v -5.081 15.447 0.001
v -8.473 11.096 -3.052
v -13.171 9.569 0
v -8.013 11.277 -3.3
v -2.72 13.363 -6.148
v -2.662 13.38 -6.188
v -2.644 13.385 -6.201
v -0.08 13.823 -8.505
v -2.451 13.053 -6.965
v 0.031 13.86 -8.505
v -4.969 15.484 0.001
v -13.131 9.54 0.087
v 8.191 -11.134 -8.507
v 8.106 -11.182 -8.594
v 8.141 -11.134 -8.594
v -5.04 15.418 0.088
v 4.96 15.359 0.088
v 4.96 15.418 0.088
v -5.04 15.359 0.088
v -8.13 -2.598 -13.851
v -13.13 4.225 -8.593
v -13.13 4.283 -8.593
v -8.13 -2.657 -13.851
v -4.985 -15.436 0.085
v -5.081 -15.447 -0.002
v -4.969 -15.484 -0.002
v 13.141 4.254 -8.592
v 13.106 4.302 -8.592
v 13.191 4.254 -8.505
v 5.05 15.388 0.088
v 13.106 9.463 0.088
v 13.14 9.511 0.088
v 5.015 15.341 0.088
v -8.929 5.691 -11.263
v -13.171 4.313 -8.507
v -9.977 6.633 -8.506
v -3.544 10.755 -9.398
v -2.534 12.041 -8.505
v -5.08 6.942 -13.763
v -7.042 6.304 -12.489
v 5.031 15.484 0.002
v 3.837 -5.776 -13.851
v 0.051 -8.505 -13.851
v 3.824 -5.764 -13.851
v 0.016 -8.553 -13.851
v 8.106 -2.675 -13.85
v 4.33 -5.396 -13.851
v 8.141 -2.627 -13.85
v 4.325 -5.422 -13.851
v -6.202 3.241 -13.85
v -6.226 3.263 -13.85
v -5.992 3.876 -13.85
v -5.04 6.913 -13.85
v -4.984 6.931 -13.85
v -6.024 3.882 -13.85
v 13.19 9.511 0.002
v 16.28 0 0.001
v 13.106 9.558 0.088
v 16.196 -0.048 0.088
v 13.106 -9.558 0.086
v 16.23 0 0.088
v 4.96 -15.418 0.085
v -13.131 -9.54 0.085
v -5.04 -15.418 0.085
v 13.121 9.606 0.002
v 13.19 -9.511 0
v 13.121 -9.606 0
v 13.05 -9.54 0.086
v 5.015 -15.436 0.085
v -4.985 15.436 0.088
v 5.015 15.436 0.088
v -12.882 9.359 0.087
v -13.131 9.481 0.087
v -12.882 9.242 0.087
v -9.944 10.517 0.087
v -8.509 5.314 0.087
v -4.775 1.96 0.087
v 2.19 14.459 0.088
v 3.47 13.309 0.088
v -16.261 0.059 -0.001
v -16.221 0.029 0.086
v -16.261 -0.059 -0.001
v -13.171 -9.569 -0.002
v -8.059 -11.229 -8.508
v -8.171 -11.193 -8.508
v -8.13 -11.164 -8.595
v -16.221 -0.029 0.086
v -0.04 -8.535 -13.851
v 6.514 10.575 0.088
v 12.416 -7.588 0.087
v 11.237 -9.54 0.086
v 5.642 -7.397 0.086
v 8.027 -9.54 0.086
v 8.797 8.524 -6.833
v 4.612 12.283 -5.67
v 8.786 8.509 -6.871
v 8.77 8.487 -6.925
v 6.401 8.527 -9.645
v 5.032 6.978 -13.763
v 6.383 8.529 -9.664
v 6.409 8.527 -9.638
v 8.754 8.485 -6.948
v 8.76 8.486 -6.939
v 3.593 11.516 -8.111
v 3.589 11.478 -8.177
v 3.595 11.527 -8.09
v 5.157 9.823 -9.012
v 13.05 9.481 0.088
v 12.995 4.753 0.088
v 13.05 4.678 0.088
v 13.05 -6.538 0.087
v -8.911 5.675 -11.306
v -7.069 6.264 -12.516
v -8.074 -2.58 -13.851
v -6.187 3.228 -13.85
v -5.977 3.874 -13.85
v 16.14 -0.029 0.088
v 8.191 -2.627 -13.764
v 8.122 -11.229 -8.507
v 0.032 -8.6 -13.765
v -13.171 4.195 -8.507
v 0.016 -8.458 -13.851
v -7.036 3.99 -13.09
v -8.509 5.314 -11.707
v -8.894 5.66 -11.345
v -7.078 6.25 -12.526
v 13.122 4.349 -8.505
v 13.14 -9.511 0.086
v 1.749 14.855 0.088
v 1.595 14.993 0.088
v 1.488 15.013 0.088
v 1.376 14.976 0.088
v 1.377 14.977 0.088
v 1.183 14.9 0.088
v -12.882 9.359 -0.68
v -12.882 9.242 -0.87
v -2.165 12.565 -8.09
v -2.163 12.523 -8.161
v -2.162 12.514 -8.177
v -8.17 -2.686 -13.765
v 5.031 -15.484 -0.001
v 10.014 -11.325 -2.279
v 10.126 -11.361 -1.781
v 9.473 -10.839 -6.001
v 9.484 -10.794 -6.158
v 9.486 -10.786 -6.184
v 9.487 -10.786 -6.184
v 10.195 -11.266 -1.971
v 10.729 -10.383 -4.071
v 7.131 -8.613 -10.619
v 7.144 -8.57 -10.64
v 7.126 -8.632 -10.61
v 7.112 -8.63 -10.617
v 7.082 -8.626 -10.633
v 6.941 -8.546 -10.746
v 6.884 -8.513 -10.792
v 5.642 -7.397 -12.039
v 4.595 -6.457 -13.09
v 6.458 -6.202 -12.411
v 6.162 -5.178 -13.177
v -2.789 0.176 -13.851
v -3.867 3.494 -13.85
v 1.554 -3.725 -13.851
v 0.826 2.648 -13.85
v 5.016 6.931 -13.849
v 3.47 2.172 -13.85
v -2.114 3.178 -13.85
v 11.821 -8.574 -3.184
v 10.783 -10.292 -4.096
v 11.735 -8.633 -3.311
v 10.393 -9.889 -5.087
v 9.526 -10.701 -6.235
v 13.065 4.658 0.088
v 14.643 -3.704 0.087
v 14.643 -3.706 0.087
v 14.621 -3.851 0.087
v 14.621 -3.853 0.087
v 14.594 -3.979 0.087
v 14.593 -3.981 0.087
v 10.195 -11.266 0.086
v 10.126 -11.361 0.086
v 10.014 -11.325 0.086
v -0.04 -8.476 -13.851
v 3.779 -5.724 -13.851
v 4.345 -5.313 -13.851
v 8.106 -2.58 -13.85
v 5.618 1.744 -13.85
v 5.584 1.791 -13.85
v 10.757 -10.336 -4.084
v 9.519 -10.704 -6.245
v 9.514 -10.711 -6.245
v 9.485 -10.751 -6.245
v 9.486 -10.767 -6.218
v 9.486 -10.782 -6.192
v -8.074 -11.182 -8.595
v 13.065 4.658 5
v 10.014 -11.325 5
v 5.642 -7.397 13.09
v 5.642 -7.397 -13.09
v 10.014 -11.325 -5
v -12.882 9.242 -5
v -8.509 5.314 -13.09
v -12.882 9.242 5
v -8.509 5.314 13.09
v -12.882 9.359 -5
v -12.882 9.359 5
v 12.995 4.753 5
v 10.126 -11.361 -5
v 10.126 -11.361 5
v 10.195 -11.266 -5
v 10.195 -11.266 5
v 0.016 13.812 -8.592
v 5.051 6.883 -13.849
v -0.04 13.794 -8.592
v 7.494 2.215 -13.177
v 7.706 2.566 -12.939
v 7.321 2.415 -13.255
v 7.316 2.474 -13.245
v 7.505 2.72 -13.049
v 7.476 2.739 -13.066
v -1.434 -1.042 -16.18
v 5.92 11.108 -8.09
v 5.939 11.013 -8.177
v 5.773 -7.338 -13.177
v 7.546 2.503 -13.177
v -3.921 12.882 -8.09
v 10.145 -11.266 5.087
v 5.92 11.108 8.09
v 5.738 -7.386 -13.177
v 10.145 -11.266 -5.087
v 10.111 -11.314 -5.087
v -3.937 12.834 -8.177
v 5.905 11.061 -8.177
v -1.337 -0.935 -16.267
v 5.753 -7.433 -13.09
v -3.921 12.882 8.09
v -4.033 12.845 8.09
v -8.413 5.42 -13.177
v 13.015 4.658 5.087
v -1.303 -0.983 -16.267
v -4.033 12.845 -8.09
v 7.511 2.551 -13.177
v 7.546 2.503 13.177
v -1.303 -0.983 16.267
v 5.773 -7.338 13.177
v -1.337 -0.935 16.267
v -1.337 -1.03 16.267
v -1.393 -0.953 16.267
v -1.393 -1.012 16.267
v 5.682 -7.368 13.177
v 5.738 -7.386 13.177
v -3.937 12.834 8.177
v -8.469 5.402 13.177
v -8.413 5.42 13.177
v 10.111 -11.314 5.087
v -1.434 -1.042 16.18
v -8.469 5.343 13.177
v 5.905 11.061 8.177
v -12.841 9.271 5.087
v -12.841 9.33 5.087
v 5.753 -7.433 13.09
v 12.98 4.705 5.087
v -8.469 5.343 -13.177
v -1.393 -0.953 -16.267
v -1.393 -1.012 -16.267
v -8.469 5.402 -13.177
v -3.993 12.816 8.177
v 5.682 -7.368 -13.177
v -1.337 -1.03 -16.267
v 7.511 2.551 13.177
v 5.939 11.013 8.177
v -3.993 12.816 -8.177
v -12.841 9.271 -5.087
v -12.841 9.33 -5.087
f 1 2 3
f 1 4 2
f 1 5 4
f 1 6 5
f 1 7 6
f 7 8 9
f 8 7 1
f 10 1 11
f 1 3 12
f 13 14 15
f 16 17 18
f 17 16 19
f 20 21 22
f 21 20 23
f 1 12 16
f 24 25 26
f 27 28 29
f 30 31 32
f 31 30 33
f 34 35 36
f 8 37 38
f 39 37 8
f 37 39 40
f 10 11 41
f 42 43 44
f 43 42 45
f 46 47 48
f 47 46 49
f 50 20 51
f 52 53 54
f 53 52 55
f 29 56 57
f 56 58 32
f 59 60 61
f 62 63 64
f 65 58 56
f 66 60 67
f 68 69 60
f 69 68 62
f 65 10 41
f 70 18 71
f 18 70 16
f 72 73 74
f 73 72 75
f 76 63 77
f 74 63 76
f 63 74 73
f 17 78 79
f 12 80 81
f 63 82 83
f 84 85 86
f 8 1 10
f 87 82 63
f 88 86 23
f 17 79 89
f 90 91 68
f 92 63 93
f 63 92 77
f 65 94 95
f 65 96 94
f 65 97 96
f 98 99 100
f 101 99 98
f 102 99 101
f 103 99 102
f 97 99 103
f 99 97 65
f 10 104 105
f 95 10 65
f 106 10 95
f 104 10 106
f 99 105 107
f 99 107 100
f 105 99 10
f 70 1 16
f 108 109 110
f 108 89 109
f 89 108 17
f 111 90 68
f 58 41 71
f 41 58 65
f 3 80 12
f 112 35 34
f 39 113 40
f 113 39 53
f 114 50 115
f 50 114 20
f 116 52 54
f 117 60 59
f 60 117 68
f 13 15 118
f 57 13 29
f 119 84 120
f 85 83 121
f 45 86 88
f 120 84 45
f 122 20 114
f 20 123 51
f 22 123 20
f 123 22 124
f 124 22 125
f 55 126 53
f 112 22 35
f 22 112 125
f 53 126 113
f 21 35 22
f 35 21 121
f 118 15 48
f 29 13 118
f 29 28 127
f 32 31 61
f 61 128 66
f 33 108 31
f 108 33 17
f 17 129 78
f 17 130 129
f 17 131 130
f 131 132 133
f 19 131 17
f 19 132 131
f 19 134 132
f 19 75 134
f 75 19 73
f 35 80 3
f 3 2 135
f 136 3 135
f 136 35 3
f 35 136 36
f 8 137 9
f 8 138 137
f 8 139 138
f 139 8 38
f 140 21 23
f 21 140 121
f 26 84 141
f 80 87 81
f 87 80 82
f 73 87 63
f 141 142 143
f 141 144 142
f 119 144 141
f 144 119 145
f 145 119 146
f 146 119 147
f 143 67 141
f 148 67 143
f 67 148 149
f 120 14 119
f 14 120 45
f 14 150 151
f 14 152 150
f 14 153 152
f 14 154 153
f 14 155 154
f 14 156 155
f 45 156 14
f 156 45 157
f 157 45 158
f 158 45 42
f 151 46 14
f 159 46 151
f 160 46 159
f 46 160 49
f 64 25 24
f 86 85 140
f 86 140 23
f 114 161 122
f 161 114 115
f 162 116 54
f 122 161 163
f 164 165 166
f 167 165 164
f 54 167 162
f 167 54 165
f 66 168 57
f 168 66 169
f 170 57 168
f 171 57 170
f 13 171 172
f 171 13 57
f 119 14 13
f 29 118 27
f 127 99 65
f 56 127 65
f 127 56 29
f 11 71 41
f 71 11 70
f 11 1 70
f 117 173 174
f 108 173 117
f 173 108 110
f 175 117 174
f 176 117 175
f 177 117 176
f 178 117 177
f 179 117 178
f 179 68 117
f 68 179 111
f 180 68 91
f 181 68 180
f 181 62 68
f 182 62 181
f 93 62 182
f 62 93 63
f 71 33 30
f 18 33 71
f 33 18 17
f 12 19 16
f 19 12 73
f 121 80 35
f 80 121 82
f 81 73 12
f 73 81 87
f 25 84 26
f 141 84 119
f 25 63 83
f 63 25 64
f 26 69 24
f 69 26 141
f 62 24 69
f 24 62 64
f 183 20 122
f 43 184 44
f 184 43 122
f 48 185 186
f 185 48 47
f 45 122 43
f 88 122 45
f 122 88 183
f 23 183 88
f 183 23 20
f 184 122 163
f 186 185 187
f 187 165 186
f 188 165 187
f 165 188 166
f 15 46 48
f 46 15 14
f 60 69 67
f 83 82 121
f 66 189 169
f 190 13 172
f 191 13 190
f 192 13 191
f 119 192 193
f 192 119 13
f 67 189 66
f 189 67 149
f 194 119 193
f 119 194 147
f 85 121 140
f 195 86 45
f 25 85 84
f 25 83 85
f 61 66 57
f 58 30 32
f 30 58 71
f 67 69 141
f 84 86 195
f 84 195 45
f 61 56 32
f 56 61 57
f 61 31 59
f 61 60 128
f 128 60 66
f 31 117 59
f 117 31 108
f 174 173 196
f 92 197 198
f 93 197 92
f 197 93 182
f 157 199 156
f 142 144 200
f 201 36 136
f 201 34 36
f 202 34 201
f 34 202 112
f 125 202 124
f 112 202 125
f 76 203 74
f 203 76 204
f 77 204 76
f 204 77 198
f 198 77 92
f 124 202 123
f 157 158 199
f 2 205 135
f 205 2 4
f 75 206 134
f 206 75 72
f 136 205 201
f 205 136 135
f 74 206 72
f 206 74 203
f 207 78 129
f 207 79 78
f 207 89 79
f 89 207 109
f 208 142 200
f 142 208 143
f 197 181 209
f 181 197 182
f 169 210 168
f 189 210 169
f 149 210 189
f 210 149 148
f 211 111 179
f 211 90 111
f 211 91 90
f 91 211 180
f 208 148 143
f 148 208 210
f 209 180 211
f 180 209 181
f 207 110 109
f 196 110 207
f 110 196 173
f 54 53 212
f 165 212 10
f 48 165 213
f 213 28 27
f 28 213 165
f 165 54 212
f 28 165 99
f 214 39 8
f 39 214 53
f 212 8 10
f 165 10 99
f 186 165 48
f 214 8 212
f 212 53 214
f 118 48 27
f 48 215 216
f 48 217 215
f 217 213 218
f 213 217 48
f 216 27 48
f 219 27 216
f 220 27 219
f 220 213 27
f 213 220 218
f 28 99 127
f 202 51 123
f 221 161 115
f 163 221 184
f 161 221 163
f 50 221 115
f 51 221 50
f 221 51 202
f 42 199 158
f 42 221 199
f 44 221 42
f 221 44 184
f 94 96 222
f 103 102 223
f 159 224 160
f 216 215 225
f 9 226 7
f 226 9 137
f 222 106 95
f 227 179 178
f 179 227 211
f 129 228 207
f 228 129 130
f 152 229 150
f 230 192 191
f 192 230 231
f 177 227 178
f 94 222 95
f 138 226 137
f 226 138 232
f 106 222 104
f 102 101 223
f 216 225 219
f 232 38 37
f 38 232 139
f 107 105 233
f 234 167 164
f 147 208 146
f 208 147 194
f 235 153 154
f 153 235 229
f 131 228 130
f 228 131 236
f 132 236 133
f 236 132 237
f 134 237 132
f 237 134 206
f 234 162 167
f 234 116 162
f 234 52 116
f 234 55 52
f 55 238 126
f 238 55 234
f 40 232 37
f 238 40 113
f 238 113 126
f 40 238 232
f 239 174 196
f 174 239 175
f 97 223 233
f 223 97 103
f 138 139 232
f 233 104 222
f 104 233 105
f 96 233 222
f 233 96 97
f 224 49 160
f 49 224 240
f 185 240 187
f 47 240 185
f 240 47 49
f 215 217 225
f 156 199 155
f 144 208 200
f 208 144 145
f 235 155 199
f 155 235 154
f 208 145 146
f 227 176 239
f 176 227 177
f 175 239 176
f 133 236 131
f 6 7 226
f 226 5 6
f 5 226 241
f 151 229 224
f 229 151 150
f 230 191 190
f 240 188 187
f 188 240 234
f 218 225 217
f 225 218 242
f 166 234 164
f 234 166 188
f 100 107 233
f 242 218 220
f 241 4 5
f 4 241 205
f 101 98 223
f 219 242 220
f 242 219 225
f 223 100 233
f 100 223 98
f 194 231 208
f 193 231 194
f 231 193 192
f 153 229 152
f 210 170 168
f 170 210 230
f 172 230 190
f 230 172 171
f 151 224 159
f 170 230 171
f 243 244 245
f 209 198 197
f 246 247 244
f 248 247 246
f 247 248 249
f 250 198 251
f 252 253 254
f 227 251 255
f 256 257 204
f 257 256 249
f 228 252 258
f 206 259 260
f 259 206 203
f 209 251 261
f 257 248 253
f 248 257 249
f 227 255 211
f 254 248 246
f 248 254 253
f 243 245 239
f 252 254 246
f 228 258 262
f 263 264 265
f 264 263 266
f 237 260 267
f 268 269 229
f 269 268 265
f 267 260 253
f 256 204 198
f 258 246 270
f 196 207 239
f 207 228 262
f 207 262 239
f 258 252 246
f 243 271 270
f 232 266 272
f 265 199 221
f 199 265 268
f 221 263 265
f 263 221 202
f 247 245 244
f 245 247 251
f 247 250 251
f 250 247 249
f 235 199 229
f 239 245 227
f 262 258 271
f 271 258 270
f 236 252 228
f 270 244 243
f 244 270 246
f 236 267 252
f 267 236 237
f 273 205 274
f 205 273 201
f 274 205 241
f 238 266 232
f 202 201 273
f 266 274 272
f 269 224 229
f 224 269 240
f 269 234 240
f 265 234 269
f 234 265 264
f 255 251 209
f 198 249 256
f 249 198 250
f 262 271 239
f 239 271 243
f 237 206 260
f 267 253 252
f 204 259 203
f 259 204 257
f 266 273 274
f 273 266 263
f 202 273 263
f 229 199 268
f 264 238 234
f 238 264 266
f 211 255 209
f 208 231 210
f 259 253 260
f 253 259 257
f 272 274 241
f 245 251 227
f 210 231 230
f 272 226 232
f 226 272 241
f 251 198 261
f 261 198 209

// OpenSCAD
// Auto-generated OpenSCAD file

    inner_points = 10*[[-1.2800868421421776, 0.9300375234937233, -0.4999999999986175], [1.00952842451697, -1.126609720368595, 0.4999999999986175], [0.7495811565537936, 0.25032633822332373, -1.309016994373636], [0.5889249096677321, 1.1013196227617108, 0.8090169943779234], [-0.39522647677644196, 1.2786499601524015, -0.8090169943722536], [-1.2800868421428393, 0.930037523491642, 0.5000000000013824], [-0.8428092367899453, 0.5372528513524985, -1.309016994374093], [1.4571111845311355, -0.3852126115666106, 4.568012634820207e-13], [0.572250819164738, -0.7338250482273702, 1.309016994374093], [1.0095284245176321, -1.1266097203665137, -0.5000000000013824], [0.15164730431657092, 1.494104294906303, 3.5040581547463034e-12], [-0.3952264767775129, 1.2786499601490338, 0.8090169943776411], [1.2964549376461445, 0.46578067297514414, 0.5000000000021215], [0.7495811565520609, 0.25032633821787476, 1.3090169943762586], [0.5889249096688031, 1.1013196227650786, -0.8090169943719714], [-0.8428092367916781, 0.5372528513470497, 1.3090169943758017], [-0.13527920881153285, -0.09828609843406824, -1.6180339887498947], [1.2964549376468066, 0.4657806729772256, -0.49999999999787836], [-0.13527920881367453, -0.09828609844080341, 1.6180339887498947], [0.5722508191664707, -0.7338250482219214, -1.3090169943758017]];

    outer_points = 10*[[1.6180339861193813, 0.0, 9.226332282866825e-05], [-1.6180339861193813, 0.0, -9.226332282866825e-05], [4.8497926242127776e-05, 1.3764661599662604, -0.8505144895094868], [7.848867363894099e-05, -0.850514490892208, -1.3764661577284751], [1.3090654955439587, 0.4254096483352815, -0.8505340370787032], [1.3090169976177166, -0.9510565116309789, -1.9547569216365145e-05], [1.309016986875918, 0.9510565116309789, 0.00016883276146815448], [-1.308968488949676, 0.4254096483352815, -0.850683322270955], [-1.309016986875918, -0.9510565116309789, -0.00016883276146815448], [-1.3090169976177166, 0.9510565116309789, 1.9547569216365145e-05], [0.8090954784139313, -0.2627292414823533, -1.3763618133434734], [0.8090655050471297, -1.113432112705552, -0.8507149509023446], [-0.8089385077054501, -0.2627292414823533, -1.3764540766663023], [-0.8089684810722516, -1.113432112705552, -0.8508072142251732], [0.5000784791704679, 0.6883272701486257, -1.3762852439048336], [0.5000000078774243, -1.5388417610408336, -0.00012389195421817631], [0.49999999049682897, 1.5388417610408336, 0.00018091382364129736], [-0.4999215192037853, 0.6883272701486257, -1.3763422657742568], [-0.49999999049682897, -1.5388417610408336, -0.00018091382364129736], [-0.5000000078774243, 1.5388417610408336, 0.00012389195421817631]];

    // Convex hull for inner set (I)
    module inner_hull() {
        hull() {
            for (p = inner_points) {
                translate(p) sphere(r=0.1);
            }
        }
    }

    // Convex hull for outer set (O) minus inner hull (O \ I)
    module outer_minus_inner() {
        difference() {
            hull() {
                for (p = outer_points) {
                    translate(p) sphere(r=0.1);
                }
            }
            inner_hull(); // Subtract inner hull
        }
    }

    // Convex hull for outer set (O) minus all translated inner hulls
    module outer_minus_AllTranslationInner() {
        difference() {
            hull() {
                for (p = outer_points) {
                    translate(p) sphere(r=0.1);
                }
            }
            hull() {
                translate([0,0,50]) inner_hull();
                translate([0,0,-50]) inner_hull();
            }; // Subtract translated inner hulls
        }
    }

    // Difference between outer_minus_inner and outer_minus_AllTranslationInner
    module outer_minus_inner_diff() {
        difference() {
            // Outer minus inner
            difference() {
                hull() {
                    for (p = outer_points) {
                        translate(p) sphere(r=0.1);
                    }
                }
                inner_hull();
            }

            // Subtract Outer minus AllTranslationInner
            difference() {
                hull() {
                    for (p = outer_points) {
                        translate(p) sphere(r=0.1);
                    }
                }
                hull() {
                    translate([0,0,50]) inner_hull();
                    translate([0,0,-50]) inner_hull();
                };
            }
        }
    }

    // Rendering all with colors applied
    color([1, 0, 0, 0.5]) inner_hull(); // Transparent red
    color([0, 1, 0, 1]) outer_minus_AllTranslationInner(); // Opaque green
    color([1, 1, 0, 1]) outer_minus_inner_diff(); // Opaque yellow
    
